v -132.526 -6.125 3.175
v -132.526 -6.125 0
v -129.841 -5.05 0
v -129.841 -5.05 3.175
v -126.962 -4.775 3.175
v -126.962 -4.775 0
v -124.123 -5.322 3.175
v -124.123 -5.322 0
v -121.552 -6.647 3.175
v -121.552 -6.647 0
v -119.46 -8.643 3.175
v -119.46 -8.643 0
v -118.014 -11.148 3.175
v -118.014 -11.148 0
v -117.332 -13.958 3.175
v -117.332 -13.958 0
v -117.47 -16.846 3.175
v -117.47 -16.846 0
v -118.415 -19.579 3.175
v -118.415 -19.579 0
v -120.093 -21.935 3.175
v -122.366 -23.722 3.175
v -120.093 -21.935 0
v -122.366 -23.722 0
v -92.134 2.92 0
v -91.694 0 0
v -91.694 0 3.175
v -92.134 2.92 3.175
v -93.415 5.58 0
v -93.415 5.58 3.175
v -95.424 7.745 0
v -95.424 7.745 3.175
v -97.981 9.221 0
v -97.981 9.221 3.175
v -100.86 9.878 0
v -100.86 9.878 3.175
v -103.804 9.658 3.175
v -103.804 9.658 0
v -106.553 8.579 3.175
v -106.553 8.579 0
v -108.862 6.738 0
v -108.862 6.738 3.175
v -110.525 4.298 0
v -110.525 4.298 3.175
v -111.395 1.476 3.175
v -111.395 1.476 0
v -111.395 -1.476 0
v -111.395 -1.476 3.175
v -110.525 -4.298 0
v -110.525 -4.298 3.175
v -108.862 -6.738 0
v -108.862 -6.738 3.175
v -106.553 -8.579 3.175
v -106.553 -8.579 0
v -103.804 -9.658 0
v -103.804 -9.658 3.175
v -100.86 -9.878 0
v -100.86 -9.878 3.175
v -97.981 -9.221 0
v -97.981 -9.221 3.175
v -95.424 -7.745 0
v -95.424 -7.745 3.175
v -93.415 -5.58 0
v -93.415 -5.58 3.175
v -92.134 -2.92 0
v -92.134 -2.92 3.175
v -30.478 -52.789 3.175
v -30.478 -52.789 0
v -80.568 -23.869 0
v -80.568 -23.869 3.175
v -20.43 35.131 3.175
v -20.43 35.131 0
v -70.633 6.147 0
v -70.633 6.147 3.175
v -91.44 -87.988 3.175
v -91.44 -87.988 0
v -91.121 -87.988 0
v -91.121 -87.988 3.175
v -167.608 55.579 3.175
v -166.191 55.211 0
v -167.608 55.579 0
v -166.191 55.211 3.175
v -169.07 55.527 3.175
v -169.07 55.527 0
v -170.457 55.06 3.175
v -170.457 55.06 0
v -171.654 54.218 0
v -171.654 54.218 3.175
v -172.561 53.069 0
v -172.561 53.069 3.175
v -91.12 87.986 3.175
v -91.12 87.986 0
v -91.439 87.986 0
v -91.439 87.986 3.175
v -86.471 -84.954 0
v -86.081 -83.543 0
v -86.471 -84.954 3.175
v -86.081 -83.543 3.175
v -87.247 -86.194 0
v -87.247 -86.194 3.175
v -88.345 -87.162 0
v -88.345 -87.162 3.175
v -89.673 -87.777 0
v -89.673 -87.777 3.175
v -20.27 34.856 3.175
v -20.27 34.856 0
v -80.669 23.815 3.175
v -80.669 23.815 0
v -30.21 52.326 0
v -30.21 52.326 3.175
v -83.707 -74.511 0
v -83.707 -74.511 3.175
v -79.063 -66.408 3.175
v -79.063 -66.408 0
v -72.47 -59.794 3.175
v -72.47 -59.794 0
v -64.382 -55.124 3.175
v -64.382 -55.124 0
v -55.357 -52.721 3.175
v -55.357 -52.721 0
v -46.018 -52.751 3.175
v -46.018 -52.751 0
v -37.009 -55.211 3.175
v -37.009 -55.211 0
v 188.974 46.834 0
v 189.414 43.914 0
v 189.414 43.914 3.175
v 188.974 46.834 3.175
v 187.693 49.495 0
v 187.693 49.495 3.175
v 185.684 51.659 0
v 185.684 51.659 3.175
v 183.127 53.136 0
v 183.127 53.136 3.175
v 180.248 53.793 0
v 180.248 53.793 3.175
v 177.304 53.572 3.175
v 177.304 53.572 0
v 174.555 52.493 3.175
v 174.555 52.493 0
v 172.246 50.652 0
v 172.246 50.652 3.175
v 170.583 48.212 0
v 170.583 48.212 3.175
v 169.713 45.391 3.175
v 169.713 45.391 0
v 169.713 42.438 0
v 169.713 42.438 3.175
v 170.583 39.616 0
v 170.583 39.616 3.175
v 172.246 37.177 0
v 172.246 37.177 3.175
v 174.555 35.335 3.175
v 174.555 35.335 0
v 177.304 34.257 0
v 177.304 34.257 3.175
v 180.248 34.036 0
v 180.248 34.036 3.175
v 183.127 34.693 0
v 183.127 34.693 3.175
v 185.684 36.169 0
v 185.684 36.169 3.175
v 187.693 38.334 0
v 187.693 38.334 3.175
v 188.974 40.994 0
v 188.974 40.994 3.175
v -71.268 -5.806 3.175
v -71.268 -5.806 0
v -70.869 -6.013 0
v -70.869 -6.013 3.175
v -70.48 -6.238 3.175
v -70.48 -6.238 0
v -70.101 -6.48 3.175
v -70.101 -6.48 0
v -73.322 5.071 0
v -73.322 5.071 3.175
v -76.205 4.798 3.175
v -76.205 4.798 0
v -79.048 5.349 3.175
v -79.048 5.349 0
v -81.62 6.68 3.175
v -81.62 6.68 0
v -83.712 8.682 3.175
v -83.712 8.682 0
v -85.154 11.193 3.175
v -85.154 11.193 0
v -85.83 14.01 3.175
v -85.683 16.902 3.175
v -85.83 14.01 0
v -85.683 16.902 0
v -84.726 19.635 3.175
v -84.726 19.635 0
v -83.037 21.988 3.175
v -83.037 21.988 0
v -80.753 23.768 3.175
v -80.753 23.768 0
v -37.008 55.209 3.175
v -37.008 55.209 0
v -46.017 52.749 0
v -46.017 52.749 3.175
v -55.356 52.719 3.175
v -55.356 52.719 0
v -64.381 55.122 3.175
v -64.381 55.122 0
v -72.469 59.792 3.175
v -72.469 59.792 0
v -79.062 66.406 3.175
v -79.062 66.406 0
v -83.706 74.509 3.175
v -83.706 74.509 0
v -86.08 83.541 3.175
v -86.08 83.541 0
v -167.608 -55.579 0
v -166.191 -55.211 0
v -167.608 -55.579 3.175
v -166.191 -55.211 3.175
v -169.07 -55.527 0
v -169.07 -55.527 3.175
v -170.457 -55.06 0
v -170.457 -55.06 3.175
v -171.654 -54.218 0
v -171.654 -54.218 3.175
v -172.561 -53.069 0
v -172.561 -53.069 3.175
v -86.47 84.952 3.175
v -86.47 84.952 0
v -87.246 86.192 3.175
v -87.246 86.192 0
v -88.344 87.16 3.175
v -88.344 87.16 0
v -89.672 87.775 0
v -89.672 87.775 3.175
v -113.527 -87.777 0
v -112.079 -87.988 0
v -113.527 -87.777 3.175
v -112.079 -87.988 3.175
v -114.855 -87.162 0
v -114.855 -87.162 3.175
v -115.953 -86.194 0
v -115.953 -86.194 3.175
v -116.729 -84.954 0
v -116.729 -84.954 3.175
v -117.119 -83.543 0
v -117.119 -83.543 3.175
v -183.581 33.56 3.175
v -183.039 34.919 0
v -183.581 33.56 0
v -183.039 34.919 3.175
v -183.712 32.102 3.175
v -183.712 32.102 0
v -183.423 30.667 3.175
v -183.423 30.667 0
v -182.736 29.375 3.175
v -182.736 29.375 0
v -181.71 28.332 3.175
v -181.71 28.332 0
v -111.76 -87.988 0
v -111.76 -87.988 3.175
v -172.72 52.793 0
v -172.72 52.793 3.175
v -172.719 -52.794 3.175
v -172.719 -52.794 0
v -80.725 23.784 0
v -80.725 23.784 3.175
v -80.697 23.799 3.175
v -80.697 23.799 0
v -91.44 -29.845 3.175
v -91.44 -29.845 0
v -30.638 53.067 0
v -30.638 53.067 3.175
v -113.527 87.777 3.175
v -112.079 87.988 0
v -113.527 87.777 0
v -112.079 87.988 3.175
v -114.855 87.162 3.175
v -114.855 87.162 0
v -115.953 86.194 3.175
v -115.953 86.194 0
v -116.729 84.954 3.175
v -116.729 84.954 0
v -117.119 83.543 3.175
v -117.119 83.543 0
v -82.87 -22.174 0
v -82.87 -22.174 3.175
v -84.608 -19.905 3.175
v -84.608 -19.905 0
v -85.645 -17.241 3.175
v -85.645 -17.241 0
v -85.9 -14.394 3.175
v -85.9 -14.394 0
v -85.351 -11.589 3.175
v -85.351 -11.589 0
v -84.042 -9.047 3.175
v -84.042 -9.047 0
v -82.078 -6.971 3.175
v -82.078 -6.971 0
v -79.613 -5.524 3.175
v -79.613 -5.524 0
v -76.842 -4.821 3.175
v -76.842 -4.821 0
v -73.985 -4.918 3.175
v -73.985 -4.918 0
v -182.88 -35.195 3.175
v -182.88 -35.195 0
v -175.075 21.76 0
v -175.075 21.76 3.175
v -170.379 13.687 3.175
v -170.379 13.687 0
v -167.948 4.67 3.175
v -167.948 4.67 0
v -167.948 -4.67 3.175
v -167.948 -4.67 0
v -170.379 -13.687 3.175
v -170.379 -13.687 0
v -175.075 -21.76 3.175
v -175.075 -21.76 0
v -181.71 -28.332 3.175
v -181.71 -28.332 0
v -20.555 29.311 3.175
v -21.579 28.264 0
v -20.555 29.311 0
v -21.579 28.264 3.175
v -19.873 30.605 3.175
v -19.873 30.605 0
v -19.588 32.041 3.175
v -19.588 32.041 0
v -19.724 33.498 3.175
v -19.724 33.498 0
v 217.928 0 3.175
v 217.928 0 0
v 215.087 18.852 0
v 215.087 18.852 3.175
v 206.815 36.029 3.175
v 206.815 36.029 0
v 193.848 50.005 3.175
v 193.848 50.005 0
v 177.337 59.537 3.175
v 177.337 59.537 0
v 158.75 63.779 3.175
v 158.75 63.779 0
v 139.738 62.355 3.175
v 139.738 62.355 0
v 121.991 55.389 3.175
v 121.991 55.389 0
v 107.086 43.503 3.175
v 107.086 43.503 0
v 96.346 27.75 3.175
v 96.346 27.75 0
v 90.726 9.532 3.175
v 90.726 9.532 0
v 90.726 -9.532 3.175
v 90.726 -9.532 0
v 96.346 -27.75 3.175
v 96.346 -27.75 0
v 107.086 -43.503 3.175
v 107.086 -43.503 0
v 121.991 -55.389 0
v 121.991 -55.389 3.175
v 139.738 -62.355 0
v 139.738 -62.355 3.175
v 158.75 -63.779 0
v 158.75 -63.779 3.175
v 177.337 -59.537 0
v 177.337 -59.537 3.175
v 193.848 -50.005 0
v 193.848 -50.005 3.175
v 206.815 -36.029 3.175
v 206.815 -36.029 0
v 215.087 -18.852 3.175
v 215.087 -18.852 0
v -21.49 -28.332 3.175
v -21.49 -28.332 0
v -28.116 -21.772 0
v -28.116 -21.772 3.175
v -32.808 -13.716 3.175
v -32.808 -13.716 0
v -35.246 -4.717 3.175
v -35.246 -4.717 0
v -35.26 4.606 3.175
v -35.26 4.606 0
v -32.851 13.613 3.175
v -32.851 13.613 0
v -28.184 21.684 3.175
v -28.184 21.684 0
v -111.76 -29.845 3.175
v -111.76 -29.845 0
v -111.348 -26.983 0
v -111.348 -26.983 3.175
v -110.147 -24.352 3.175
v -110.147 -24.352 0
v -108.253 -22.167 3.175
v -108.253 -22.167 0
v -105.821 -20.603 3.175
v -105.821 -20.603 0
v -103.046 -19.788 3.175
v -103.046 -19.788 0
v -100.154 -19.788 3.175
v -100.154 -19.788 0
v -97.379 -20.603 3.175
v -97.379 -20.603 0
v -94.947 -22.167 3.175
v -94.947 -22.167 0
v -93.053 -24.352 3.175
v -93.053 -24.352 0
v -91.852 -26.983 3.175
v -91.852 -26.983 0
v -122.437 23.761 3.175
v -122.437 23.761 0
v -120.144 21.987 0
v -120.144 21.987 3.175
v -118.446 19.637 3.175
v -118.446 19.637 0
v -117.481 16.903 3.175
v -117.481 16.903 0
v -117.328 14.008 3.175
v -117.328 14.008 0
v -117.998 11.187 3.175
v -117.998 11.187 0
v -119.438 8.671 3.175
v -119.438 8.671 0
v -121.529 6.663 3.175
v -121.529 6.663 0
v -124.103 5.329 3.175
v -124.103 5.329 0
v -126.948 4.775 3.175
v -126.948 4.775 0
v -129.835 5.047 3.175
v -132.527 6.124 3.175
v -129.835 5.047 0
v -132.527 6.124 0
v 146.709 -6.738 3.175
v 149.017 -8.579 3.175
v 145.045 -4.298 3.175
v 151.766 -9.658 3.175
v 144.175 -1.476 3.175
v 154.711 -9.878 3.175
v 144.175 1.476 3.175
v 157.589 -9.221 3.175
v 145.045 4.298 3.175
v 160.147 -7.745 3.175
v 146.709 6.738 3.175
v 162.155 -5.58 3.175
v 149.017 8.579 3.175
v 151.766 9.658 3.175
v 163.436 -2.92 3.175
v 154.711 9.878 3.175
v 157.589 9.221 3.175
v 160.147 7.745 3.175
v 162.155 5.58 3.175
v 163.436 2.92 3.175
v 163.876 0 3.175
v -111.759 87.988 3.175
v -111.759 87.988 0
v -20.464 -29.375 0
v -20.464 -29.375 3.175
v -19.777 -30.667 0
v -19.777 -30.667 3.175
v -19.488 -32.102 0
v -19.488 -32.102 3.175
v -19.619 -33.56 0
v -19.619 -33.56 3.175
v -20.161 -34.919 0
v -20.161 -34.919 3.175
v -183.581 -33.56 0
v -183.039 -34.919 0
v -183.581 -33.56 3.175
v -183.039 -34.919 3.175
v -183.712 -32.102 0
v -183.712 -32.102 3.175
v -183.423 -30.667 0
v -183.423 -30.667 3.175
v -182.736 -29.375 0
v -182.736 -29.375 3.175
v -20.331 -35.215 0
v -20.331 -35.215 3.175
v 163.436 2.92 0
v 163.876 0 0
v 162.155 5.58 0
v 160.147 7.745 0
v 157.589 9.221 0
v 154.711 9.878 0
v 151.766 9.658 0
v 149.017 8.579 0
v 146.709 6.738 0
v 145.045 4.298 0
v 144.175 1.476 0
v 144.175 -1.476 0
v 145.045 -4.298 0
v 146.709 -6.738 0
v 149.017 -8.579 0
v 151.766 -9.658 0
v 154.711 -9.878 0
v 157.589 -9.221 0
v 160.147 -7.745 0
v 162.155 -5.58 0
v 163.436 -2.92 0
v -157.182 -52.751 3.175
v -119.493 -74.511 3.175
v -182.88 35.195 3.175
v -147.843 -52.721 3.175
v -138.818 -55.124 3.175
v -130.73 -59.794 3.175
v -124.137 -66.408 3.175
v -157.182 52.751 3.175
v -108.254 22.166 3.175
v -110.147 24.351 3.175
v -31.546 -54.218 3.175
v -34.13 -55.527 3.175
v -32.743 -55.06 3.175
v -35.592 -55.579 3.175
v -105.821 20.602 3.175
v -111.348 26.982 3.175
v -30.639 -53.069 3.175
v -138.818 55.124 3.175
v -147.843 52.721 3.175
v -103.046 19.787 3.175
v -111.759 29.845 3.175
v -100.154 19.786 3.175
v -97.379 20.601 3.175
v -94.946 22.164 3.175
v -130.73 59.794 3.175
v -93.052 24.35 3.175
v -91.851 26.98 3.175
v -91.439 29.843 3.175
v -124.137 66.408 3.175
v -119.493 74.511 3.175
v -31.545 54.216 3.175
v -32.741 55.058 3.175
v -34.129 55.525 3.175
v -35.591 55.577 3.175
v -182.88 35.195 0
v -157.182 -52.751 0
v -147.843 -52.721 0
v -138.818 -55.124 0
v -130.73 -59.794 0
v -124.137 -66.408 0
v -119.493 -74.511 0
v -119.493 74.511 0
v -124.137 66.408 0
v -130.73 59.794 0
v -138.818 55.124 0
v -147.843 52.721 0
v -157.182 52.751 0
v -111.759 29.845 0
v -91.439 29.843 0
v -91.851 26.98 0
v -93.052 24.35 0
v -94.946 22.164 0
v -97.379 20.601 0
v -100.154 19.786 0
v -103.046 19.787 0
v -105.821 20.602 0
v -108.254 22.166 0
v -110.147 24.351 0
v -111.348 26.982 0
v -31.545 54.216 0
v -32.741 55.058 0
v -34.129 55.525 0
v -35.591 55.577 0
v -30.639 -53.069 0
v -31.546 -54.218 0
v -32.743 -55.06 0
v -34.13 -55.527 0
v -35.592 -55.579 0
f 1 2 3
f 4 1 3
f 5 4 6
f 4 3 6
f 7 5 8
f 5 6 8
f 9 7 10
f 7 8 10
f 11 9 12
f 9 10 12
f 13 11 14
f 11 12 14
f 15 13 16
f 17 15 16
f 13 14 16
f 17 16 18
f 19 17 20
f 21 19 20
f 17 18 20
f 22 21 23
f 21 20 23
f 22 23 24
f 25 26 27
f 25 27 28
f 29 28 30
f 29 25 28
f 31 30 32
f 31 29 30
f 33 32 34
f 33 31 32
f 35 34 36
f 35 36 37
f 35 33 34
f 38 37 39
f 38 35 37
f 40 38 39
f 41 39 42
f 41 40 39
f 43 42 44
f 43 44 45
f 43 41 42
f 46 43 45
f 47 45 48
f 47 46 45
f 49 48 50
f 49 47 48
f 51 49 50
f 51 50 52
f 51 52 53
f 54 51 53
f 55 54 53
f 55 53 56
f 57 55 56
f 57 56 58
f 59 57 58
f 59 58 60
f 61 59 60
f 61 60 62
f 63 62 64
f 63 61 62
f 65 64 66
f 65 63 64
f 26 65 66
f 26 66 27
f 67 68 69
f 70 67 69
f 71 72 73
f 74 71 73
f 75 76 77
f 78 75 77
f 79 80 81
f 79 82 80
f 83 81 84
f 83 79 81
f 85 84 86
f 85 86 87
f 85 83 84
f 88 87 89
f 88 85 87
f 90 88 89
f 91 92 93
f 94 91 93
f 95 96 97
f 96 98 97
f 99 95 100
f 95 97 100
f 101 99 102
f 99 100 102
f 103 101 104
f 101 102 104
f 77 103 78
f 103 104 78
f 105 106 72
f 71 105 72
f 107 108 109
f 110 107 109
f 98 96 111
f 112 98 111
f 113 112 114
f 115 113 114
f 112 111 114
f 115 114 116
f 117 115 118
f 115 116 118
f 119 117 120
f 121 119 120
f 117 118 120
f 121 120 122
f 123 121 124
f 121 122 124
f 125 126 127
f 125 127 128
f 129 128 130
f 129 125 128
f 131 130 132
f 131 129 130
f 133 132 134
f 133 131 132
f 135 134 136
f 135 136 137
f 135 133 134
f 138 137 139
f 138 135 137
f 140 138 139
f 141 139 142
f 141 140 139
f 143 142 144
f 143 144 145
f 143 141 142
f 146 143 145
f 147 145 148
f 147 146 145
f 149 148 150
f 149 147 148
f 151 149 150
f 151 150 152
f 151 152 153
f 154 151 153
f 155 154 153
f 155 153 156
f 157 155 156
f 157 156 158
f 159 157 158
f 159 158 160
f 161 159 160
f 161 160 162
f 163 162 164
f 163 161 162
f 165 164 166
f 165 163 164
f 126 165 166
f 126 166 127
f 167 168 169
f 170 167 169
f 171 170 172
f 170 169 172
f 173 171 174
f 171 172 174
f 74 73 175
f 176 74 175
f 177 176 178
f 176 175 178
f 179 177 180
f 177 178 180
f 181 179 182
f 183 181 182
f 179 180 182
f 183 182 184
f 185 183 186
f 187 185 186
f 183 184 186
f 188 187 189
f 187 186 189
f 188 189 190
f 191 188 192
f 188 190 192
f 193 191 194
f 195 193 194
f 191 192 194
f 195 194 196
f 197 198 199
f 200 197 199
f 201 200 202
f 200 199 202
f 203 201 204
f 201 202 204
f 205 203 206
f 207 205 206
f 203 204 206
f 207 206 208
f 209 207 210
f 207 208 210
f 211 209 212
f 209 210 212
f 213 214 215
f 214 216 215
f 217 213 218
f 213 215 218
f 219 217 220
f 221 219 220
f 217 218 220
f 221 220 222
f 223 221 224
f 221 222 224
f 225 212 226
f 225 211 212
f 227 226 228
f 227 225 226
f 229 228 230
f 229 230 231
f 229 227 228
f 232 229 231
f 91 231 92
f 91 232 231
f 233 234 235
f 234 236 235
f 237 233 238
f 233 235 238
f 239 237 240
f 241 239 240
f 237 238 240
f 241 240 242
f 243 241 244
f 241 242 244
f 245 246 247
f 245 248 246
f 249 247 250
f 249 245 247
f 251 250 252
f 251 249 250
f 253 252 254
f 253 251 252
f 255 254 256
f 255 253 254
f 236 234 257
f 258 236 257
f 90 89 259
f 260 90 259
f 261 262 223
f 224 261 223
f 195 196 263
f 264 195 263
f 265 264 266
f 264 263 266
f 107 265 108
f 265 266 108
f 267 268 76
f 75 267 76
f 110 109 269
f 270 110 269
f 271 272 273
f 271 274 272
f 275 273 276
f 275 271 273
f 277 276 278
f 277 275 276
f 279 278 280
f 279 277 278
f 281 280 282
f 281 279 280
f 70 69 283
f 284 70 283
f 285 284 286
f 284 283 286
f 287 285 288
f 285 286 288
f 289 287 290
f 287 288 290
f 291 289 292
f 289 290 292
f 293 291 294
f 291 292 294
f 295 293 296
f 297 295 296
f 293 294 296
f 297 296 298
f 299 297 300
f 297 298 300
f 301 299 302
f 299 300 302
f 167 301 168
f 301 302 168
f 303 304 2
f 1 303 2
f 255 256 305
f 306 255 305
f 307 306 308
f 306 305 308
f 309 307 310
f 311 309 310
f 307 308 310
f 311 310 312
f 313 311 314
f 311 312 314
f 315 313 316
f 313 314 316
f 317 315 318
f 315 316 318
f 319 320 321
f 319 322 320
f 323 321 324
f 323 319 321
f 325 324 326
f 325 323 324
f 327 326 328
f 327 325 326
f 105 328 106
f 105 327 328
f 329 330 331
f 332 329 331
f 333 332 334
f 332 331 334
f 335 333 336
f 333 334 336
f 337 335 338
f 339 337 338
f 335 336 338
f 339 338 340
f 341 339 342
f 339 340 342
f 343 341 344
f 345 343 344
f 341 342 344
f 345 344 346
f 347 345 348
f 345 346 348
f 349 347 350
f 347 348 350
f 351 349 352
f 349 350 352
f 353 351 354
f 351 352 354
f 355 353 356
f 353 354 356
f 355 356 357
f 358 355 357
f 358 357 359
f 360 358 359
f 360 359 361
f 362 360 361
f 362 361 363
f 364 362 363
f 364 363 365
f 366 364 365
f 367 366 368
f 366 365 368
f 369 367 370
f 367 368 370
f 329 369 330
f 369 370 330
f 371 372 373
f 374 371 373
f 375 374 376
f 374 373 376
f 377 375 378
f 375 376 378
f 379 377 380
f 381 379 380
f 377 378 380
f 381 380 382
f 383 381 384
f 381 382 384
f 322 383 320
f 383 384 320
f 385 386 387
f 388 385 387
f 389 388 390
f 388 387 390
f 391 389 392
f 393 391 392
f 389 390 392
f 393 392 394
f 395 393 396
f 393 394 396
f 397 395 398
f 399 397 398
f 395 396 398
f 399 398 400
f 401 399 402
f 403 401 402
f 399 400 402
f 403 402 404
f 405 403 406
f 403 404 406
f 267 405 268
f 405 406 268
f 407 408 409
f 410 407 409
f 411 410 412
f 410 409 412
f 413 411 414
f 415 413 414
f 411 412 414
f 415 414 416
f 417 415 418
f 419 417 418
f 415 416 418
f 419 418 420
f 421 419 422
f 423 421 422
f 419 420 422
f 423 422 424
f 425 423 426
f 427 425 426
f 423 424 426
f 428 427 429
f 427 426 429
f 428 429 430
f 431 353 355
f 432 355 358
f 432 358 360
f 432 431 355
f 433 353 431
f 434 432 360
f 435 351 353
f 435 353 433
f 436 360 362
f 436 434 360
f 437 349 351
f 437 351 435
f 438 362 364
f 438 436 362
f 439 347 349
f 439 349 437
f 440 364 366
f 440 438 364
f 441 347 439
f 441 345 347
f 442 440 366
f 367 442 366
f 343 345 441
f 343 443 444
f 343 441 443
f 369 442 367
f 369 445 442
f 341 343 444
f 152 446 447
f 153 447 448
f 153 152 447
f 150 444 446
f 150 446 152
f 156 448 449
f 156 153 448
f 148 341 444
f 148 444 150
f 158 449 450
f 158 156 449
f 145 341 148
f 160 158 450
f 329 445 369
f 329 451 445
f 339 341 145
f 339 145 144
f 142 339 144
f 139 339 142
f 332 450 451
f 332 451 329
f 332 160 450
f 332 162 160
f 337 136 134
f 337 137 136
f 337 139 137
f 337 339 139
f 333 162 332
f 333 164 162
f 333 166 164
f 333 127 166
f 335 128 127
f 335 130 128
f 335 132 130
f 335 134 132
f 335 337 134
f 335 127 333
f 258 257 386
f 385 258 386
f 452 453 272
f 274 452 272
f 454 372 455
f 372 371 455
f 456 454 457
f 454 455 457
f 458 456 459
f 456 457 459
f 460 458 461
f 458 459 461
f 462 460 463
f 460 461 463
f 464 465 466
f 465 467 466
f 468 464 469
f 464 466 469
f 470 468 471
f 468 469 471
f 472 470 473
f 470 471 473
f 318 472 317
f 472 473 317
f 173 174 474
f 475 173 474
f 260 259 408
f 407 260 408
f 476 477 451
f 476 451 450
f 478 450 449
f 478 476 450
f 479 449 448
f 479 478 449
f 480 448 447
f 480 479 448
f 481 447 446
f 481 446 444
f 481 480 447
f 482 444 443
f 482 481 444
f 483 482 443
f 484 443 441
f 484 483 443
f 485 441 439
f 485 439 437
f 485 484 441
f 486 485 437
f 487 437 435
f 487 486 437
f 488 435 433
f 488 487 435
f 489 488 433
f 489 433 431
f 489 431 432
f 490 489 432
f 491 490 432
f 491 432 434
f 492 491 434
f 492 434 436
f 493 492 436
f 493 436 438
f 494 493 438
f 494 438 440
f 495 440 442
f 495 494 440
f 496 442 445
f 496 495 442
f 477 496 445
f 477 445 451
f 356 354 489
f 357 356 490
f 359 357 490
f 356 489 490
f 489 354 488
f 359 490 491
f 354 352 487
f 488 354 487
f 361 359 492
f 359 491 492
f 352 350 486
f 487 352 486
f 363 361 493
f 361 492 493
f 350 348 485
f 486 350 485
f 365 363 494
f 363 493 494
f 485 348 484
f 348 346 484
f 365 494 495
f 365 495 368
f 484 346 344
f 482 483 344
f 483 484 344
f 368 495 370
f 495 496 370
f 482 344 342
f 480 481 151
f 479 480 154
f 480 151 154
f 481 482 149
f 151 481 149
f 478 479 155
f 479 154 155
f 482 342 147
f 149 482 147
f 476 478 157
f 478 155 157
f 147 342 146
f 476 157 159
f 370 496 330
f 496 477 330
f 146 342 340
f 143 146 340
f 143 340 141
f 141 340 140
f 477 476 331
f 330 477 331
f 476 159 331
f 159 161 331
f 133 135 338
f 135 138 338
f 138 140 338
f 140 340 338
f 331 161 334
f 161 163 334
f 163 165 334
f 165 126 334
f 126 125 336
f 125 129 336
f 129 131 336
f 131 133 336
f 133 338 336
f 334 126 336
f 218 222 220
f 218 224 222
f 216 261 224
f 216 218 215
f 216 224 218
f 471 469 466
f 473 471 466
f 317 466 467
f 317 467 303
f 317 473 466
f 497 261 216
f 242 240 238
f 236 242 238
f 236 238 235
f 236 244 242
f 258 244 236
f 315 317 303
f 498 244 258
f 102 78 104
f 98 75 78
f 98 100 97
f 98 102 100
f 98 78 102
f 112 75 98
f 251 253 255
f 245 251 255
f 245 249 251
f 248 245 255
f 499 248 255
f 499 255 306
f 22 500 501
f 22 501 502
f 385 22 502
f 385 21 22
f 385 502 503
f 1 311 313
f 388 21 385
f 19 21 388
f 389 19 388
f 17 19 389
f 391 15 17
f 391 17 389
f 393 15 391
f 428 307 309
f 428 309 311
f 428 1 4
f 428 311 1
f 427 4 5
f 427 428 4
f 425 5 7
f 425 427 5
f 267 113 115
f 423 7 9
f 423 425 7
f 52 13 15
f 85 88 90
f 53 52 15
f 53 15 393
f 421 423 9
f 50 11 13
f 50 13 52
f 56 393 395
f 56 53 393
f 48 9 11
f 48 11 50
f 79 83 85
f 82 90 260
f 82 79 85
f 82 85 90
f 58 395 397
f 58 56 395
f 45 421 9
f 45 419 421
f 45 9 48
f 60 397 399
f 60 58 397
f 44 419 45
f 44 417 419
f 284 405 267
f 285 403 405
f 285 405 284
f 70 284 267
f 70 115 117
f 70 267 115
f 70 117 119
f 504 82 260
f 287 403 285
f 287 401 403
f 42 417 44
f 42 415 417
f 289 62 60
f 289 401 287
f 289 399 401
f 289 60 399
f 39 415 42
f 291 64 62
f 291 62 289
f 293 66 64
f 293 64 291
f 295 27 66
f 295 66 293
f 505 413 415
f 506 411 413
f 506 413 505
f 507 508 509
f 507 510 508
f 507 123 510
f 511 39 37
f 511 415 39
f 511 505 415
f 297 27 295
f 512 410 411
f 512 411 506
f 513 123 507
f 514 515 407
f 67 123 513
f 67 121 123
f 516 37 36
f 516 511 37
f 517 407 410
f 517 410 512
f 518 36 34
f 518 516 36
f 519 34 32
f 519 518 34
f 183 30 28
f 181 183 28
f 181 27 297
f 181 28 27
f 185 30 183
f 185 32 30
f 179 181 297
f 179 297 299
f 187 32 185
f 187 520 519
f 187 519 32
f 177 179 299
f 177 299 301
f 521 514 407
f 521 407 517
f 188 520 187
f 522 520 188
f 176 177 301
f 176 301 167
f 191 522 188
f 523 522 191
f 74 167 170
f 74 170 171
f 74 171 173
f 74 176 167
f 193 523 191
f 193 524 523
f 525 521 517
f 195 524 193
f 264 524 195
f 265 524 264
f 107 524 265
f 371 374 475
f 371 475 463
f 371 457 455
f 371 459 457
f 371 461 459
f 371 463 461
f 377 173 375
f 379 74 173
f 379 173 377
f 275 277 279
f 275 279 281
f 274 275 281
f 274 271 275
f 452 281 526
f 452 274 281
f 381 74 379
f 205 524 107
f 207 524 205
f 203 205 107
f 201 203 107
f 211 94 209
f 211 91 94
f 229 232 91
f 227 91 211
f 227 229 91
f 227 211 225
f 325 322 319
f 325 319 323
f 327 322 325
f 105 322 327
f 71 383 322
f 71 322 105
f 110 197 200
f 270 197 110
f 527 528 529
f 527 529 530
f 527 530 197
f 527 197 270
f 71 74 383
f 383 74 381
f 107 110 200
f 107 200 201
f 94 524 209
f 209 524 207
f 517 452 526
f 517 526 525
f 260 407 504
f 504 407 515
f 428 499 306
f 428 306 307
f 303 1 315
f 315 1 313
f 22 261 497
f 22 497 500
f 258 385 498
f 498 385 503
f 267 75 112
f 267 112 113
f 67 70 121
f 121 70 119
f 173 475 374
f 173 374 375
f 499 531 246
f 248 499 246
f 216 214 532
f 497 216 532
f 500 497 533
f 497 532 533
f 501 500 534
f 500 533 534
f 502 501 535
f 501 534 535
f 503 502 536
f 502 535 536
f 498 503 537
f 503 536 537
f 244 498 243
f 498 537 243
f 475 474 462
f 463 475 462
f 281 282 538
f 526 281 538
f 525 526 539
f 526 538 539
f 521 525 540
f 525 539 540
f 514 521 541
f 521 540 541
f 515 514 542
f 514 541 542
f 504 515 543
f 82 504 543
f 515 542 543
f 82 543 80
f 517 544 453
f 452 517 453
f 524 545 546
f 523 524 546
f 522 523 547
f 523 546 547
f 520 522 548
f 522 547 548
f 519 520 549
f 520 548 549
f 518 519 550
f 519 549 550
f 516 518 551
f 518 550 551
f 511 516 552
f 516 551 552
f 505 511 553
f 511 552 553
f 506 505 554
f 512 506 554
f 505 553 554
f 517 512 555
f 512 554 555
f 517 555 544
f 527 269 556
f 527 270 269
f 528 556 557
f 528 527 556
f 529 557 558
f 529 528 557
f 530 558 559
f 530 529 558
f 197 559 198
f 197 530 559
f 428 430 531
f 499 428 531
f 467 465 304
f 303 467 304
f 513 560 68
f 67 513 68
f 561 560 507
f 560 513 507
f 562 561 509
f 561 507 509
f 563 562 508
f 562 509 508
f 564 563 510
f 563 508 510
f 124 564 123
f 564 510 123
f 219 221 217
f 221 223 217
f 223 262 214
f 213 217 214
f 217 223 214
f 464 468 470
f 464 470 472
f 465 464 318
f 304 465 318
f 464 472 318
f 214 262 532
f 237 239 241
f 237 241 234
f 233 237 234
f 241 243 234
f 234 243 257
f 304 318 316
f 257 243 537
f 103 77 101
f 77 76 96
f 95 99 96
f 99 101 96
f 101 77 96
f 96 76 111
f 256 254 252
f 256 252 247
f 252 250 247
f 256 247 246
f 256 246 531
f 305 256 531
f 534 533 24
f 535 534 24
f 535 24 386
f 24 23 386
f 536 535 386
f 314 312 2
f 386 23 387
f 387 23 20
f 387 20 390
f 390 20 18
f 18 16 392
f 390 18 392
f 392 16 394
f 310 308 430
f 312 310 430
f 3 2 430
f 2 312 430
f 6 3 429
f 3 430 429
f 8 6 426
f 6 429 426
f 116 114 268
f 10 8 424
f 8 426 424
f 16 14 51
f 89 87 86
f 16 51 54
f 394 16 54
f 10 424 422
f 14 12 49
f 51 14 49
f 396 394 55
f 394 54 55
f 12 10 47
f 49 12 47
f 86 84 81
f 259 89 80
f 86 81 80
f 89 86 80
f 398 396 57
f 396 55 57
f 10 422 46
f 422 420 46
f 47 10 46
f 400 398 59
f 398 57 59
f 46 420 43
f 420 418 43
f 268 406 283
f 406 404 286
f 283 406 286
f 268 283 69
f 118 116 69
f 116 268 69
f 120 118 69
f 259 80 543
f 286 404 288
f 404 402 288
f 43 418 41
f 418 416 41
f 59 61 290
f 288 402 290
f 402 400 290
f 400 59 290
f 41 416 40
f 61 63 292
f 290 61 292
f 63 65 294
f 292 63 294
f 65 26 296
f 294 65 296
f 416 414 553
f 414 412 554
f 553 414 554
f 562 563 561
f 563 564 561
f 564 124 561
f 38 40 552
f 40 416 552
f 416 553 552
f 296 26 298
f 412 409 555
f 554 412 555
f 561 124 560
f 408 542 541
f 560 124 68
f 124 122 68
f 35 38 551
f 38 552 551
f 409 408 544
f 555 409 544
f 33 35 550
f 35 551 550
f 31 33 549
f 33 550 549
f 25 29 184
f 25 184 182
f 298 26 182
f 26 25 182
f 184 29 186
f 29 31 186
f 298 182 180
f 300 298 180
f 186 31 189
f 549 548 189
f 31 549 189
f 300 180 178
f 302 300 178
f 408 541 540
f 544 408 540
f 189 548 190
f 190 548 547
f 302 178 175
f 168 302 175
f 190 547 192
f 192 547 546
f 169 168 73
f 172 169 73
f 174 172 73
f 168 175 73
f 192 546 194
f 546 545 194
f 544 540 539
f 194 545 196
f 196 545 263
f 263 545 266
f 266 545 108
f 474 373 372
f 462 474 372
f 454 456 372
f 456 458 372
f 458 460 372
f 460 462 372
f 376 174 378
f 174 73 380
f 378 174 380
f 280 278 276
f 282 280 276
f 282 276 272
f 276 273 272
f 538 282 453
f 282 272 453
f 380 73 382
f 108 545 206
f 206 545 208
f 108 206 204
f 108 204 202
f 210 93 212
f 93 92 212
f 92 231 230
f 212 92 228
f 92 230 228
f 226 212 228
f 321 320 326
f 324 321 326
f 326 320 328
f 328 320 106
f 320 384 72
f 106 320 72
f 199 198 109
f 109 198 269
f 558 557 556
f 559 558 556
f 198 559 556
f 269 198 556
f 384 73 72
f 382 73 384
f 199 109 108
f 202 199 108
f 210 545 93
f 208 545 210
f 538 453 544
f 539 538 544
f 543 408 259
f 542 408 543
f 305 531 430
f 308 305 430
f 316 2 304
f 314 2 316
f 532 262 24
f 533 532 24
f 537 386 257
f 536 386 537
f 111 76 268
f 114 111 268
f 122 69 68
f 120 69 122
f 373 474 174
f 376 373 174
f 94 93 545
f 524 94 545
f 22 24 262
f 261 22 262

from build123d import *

# Parameters (mm, degrees)
F0_R     = 9.906
F1_DEPTH = 3.175
F2_R     = 5.08
F0_R_2   = 63.9582216699
F0_R_3   = 33.02
F3_DEPTH = 3.175


# Not quite as in the source:
# - a length typed as a fraction of an inch, garbled in the dataset ("3 / 203.2 mm" for 3/8 in), is restored
# - a feature names something its author has since deleted; it is built from what else it names


with BuildPart() as f1:
    # F0 (on Top) → F1 (new body)
    with BuildSketch(Plane.XY):
        with BuildLine():
            ThreePointArc((-17.78, -30.7958633586), (-35.5599563921, -0.0556901267), (-17.8763707949, 30.7400222382))
            Line((-17.8763707949, 30.7400222382), (-20.4296415334, 35.1306001794))
            Line((-20.4296415334, 35.1306001794), (-70.6329627114, 6.1469720917))
            ThreePointArc((-70.6329627114, 6.1469720917), (-84.5232381264, 9.8860746707), (-80.7525608015, 23.7678120156))
            ThreePointArc((-80.7525608015, 23.7678120156), (-80.7108842522, 23.7914906594), (-80.6690964546, 23.8149724163))
            Line((-80.6690964546, 23.8149724163), (-30.2104125797, 52.3259695061))
            Line((-30.2104125797, 52.3259695061), (-33.0188105519, 57.1902574851))
            ThreePointArc((-33.0188105519, 57.1902574851), (-68.5788105527, 57.1902574837), (-86.3588105535, 87.9861208428))
            Line((-86.3588105535, 87.9861208428), (-91.4394053355, 87.9861208428))
            Line((-91.4394053355, 87.9861208428), (-91.4394053355, 29.8429398183))
            ThreePointArc((-91.4394053355, 29.8429398183), (-101.6004354264, 19.6829398705), (-111.7594051266, 29.845))
            Line((-111.7594051266, 29.845), (-111.7594051266, 87.9881810245))
            Line((-111.7594051266, 87.9881810245), (-116.84, 87.9881810245))
            ThreePointArc((-116.84, 87.9881810245), (-134.62, 57.1923176659), (-170.18, 57.1923176659))
            Line((-170.18, 57.1923176659), (-172.7201599914, 52.7926315014))
            Line((-172.7201599914, 52.7926315014), (-122.4365198362, 23.7613583219))
            ThreePointArc((-122.4365198362, 23.7613583219), (-118.627620527, 9.8774561073), (-132.5265281759, 6.1236818976))
            Line((-132.5265281759, 6.1236818976), (-182.88, 35.1952724098))
            Line((-182.88, 35.1952724098), (-185.42, 30.7958633586))
            ThreePointArc((-185.42, 30.7958633586), (-167.64, 0), (-185.42, -30.7958633586))
            Line((-185.42, -30.7958633586), (-182.8800000009, -35.1952724082))
            Line((-182.8800000009, -35.1952724082), (-132.5258080212, -6.1245428478))
            ThreePointArc((-132.5258080212, -6.1245428478), (-118.6470606402, -9.8436248763), (-122.3661426686, -23.7223722573))
            Line((-122.3661426686, -23.7223722573), (-172.7194471607, -52.7938661604))
            Line((-172.7194471607, -52.7938661604), (-170.18, -57.1923176659))
            ThreePointArc((-170.18, -57.1923176659), (-134.62, -57.1923176659), (-116.84, -87.9881810245))
            Line((-116.84, -87.9881810245), (-111.76, -87.9881810245))
            Line((-111.76, -87.9881810245), (-111.76, -29.845))
            ThreePointArc((-111.76, -29.845), (-101.6, -19.685), (-91.44, -29.845))
            Line((-91.44, -29.845), (-91.4399999997, -87.9881810245))
            Line((-91.4399999997, -87.9881810245), (-86.36, -87.9881810245))
            ThreePointArc((-86.36, -87.9881810245), (-68.58, -57.1923176659), (-33.02, -57.1923176659))
            Line((-33.02, -57.1923176659), (-30.4777274407, -52.7889724266))
            Line((-30.4777274407, -52.7889724266), (-80.5680413022, -23.8693162349))
            ThreePointArc((-80.5680413022, -23.8693162349), (-84.7865541797, -10.2717986383), (-71.2681836795, -5.8061525812))
            ThreePointArc((-71.2681836795, -5.8061525812), (-70.6734718241, -6.1236818976), (-70.1011274419, -6.4799528141))
            Line((-70.1011274419, -6.4799528141), (-20.3311837367, -35.2146432099))
            Line((-20.3311837367, -35.2146432099), (-17.78, -30.7958633586))
        make_face()
        with Locations((-101.6, 0)):
            Circle(F0_R, mode=Mode.SUBTRACT)
    extrude(amount=F1_DEPTH)

    # F2
    f2_edges = [f1.edges().sort_by_distance(p)[0] for p in [
        (-17.876371, 30.740022, 1.5875),
        (-17.78, -30.795863, 1.5875),
        (-33.02, -57.192318, 1.5875),
        (-86.36, -87.988181, 1.5875),
        (-116.84, -87.988181, 1.5875),
        (-170.18, -57.192318, 1.5875),
        (-185.42, -30.795863, 1.5875),
        (-185.42, 30.795863, 1.5875),
        (-116.84, 87.988181, 1.5875),
        (-86.358811, 87.986121, 1.5875),
        (-33.018811, 57.190257, 1.5875),
        (-170.18, 57.192318, 1.5875),
    ]]
    fillet(f2_edges, radius=F2_R)


with BuildPart() as f3:
    # F0 (on Top) → F3 (new body)
    with BuildSketch(Plane.XY):
        with Locations((153.9702564478, 0)):
            Circle(F0_R_2)
        with Locations((153.9702564478, 0)):
            Circle(F0_R_3, mode=Mode.SUBTRACT)
        with Locations((179.5079290119, 43.9143174831)):
            Circle(F0_R, mode=Mode.SUBTRACT)
        with Locations((153.9702564478, 0)):
            Circle(F0_R_3)
        with Locations((153.9702564478, 0)):
            Circle(F0_R, mode=Mode.SUBTRACT)
    extrude(amount=F3_DEPTH)


solid = Compound([f1.part, f3.part])
